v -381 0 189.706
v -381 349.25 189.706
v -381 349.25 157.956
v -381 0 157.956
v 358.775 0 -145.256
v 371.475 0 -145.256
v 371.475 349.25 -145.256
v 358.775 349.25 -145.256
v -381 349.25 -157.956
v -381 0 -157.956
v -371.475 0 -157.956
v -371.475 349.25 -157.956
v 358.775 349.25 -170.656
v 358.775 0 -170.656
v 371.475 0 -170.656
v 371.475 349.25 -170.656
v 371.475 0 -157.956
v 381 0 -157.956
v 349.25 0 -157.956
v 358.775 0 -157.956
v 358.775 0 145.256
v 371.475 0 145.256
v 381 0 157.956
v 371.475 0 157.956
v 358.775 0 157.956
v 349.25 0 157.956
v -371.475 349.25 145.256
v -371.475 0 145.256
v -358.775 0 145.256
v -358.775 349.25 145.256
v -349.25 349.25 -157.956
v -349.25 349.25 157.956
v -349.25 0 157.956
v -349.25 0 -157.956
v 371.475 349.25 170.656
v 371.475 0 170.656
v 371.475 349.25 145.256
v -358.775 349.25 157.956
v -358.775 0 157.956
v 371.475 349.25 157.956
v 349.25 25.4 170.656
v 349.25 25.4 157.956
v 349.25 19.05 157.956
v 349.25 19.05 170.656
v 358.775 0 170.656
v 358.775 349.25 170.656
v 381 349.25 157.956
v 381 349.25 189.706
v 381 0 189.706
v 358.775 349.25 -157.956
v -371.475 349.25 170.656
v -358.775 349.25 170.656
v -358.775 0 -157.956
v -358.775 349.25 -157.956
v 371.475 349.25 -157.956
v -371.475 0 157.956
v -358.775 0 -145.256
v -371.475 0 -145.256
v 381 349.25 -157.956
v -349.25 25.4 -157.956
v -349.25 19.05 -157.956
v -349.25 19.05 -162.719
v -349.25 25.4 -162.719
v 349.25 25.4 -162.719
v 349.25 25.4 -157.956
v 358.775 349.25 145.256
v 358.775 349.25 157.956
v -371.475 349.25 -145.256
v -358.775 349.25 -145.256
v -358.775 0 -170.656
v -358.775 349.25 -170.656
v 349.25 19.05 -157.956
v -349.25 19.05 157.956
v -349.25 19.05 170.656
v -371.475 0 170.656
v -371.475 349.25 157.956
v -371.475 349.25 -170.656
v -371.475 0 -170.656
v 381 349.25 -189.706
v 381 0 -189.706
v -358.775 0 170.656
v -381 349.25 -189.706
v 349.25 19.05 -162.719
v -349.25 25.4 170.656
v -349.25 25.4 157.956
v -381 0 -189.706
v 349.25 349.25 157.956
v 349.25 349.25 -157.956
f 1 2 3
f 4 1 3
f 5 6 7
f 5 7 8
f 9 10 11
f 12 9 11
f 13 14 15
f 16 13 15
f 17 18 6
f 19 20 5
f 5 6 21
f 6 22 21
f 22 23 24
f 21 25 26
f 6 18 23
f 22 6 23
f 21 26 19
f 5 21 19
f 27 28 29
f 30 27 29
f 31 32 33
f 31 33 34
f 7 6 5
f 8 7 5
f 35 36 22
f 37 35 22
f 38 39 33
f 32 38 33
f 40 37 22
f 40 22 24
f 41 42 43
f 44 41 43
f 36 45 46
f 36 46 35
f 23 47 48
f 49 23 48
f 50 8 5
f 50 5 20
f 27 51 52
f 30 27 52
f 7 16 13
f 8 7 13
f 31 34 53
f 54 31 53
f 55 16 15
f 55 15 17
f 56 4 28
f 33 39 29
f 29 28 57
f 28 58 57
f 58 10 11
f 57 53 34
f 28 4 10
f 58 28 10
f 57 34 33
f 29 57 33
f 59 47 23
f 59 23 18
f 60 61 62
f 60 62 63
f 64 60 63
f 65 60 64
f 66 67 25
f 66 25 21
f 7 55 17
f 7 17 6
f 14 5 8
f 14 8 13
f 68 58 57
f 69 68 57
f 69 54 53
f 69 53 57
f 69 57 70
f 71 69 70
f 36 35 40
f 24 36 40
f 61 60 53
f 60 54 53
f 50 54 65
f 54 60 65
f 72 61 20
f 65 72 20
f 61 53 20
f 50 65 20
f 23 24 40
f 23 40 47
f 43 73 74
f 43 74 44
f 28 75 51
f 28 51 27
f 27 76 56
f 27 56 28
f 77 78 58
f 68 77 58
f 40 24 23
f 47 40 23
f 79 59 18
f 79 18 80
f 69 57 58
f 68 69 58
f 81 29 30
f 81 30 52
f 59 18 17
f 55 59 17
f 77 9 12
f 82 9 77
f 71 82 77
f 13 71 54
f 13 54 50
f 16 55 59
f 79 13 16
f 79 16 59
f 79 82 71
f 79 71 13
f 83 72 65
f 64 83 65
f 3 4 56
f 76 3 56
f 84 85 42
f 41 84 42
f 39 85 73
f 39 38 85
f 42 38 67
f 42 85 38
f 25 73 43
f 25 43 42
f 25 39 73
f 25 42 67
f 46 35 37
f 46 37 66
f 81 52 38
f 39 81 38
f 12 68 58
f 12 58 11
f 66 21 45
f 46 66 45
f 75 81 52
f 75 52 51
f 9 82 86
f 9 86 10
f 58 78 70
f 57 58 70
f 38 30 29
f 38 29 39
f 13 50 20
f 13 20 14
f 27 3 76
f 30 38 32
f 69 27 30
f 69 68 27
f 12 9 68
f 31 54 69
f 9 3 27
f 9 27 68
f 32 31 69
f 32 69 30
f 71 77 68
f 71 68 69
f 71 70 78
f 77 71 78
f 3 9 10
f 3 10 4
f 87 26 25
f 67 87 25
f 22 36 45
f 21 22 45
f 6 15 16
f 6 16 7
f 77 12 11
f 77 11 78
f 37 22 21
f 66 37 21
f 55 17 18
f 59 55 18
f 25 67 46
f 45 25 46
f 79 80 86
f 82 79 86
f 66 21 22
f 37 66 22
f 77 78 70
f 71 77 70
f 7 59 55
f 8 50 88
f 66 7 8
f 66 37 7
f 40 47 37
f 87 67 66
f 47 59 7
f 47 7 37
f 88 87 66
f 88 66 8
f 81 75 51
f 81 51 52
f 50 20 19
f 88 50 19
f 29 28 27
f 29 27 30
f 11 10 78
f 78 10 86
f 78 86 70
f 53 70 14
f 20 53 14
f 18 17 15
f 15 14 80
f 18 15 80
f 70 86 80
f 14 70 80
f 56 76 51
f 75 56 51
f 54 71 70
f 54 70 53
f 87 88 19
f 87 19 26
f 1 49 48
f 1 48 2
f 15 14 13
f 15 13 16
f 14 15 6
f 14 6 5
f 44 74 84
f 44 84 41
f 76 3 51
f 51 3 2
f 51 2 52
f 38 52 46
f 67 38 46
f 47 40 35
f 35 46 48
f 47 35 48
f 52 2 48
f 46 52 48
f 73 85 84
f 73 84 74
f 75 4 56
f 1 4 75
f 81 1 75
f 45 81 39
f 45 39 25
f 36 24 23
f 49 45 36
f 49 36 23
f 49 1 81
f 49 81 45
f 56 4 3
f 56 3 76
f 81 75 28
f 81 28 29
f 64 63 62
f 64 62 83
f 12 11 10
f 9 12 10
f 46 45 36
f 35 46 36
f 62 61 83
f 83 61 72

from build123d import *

# Parameters (mm, degrees)
F1_DEPTH  = 349.25
F2_DEPTH  = 349.25
F5_W      = 698.5
F5_H      = 6.35
F6_DEPTH  = 4.7625
F7_W      = 698.5
F7_H      = 6.35
F8_DEPTH  = 12.7
F10_DEPTH = 349.25


# Not quite as in the source:
# - a feature names something its author has since deleted; it is built from what else it names


with BuildPart() as f1:
    # F0 (on Front) → F1 (new body)
    with BuildSketch(Plane.XZ):
        Polygon((371.475, 157.95625), (381, 157.95625), (381, 189.70625), (-381, 189.70625), (-381, 157.95625), (-371.475, 157.95625), (-371.475, 170.65625), (-358.775, 170.65625), (-358.775, 157.95625), (-349.25, 157.95625), (349.25, 157.95625), (358.775, 157.95625), (358.775, 170.65625), (371.475, 170.65625), align=None)
    extrude(amount=-F1_DEPTH)


with BuildPart() as f2:
    # F0 (on Front) → F2 (new body)
    with BuildSketch(Plane.XZ):
        Polygon((-381, 157.95625), (-381, -157.95625), (-371.475, -157.95625), (-371.475, -145.25625), (-358.775, -145.25625), (-358.775, -157.95625), (-349.25, -157.95625), (-349.25, 157.95625), (-358.775, 157.95625), (-358.775, 145.25625), (-371.475, 145.25625), (-371.475, 157.95625), align=None)
    extrude(amount=-F2_DEPTH)


with BuildPart() as f3_1:
    # F3: instance of F1
    add(f1.part.mirror(Plane.XY))

    # F5 (on face) → F6 (cut)
    with BuildSketch(Plane.XY.offset(-157.95625)):
        with Locations((0, 22.225)):
            Rectangle(F5_W, F5_H)
    extrude(amount=-F6_DEPTH, mode=Mode.SUBTRACT)


with BuildPart() as f3_2:
    # F3: instance of F2
    add(f2.part.mirror(Plane.XY))


with BuildPart() as f4_1:
    # F4: instance of F2
    add(f2.part.mirror(Plane.YZ))


with BuildPart() as f1_1:
    add(f1.part)

    # F7 (on face) → F8 (cut)
    with BuildSketch(Plane(origin=(0, 0, 157.95625), x_dir=(1, 0, 0), z_dir=(0, 0, -1))):
        with Locations((0, -22.225)):
            Rectangle(F7_W, F7_H)
    extrude(amount=-F8_DEPTH, mode=Mode.SUBTRACT)


with BuildPart() as f10:
    # F9 (on face) → F10 (new body, through all)
    with BuildSketch(Plane.XZ):
        Polygon((-371.475, 170.65625), (-371.475, 157.95625), (-371.475, 145.25625), (-358.775, 145.25625), (-358.775, 157.95625), (-358.775, 170.65625), align=None)
    extrude(amount=-F10_DEPTH)


with BuildPart() as f11_1:
    # F11: instance of F10
    add(f10.part.mirror(Plane.YZ))


with BuildPart() as f12_1:
    # F12: instance of F10
    add(f10.part.mirror(Plane.XY))


with BuildPart() as f12_2:
    # F12: instance of F11_1
    add(f11_1.part.mirror(Plane.XY))


solid = Compound([f3_1.part, f3_2.part, f4_1.part, f1_1.part, f10.part, f11_1.part, f12_1.part, f12_2.part])
